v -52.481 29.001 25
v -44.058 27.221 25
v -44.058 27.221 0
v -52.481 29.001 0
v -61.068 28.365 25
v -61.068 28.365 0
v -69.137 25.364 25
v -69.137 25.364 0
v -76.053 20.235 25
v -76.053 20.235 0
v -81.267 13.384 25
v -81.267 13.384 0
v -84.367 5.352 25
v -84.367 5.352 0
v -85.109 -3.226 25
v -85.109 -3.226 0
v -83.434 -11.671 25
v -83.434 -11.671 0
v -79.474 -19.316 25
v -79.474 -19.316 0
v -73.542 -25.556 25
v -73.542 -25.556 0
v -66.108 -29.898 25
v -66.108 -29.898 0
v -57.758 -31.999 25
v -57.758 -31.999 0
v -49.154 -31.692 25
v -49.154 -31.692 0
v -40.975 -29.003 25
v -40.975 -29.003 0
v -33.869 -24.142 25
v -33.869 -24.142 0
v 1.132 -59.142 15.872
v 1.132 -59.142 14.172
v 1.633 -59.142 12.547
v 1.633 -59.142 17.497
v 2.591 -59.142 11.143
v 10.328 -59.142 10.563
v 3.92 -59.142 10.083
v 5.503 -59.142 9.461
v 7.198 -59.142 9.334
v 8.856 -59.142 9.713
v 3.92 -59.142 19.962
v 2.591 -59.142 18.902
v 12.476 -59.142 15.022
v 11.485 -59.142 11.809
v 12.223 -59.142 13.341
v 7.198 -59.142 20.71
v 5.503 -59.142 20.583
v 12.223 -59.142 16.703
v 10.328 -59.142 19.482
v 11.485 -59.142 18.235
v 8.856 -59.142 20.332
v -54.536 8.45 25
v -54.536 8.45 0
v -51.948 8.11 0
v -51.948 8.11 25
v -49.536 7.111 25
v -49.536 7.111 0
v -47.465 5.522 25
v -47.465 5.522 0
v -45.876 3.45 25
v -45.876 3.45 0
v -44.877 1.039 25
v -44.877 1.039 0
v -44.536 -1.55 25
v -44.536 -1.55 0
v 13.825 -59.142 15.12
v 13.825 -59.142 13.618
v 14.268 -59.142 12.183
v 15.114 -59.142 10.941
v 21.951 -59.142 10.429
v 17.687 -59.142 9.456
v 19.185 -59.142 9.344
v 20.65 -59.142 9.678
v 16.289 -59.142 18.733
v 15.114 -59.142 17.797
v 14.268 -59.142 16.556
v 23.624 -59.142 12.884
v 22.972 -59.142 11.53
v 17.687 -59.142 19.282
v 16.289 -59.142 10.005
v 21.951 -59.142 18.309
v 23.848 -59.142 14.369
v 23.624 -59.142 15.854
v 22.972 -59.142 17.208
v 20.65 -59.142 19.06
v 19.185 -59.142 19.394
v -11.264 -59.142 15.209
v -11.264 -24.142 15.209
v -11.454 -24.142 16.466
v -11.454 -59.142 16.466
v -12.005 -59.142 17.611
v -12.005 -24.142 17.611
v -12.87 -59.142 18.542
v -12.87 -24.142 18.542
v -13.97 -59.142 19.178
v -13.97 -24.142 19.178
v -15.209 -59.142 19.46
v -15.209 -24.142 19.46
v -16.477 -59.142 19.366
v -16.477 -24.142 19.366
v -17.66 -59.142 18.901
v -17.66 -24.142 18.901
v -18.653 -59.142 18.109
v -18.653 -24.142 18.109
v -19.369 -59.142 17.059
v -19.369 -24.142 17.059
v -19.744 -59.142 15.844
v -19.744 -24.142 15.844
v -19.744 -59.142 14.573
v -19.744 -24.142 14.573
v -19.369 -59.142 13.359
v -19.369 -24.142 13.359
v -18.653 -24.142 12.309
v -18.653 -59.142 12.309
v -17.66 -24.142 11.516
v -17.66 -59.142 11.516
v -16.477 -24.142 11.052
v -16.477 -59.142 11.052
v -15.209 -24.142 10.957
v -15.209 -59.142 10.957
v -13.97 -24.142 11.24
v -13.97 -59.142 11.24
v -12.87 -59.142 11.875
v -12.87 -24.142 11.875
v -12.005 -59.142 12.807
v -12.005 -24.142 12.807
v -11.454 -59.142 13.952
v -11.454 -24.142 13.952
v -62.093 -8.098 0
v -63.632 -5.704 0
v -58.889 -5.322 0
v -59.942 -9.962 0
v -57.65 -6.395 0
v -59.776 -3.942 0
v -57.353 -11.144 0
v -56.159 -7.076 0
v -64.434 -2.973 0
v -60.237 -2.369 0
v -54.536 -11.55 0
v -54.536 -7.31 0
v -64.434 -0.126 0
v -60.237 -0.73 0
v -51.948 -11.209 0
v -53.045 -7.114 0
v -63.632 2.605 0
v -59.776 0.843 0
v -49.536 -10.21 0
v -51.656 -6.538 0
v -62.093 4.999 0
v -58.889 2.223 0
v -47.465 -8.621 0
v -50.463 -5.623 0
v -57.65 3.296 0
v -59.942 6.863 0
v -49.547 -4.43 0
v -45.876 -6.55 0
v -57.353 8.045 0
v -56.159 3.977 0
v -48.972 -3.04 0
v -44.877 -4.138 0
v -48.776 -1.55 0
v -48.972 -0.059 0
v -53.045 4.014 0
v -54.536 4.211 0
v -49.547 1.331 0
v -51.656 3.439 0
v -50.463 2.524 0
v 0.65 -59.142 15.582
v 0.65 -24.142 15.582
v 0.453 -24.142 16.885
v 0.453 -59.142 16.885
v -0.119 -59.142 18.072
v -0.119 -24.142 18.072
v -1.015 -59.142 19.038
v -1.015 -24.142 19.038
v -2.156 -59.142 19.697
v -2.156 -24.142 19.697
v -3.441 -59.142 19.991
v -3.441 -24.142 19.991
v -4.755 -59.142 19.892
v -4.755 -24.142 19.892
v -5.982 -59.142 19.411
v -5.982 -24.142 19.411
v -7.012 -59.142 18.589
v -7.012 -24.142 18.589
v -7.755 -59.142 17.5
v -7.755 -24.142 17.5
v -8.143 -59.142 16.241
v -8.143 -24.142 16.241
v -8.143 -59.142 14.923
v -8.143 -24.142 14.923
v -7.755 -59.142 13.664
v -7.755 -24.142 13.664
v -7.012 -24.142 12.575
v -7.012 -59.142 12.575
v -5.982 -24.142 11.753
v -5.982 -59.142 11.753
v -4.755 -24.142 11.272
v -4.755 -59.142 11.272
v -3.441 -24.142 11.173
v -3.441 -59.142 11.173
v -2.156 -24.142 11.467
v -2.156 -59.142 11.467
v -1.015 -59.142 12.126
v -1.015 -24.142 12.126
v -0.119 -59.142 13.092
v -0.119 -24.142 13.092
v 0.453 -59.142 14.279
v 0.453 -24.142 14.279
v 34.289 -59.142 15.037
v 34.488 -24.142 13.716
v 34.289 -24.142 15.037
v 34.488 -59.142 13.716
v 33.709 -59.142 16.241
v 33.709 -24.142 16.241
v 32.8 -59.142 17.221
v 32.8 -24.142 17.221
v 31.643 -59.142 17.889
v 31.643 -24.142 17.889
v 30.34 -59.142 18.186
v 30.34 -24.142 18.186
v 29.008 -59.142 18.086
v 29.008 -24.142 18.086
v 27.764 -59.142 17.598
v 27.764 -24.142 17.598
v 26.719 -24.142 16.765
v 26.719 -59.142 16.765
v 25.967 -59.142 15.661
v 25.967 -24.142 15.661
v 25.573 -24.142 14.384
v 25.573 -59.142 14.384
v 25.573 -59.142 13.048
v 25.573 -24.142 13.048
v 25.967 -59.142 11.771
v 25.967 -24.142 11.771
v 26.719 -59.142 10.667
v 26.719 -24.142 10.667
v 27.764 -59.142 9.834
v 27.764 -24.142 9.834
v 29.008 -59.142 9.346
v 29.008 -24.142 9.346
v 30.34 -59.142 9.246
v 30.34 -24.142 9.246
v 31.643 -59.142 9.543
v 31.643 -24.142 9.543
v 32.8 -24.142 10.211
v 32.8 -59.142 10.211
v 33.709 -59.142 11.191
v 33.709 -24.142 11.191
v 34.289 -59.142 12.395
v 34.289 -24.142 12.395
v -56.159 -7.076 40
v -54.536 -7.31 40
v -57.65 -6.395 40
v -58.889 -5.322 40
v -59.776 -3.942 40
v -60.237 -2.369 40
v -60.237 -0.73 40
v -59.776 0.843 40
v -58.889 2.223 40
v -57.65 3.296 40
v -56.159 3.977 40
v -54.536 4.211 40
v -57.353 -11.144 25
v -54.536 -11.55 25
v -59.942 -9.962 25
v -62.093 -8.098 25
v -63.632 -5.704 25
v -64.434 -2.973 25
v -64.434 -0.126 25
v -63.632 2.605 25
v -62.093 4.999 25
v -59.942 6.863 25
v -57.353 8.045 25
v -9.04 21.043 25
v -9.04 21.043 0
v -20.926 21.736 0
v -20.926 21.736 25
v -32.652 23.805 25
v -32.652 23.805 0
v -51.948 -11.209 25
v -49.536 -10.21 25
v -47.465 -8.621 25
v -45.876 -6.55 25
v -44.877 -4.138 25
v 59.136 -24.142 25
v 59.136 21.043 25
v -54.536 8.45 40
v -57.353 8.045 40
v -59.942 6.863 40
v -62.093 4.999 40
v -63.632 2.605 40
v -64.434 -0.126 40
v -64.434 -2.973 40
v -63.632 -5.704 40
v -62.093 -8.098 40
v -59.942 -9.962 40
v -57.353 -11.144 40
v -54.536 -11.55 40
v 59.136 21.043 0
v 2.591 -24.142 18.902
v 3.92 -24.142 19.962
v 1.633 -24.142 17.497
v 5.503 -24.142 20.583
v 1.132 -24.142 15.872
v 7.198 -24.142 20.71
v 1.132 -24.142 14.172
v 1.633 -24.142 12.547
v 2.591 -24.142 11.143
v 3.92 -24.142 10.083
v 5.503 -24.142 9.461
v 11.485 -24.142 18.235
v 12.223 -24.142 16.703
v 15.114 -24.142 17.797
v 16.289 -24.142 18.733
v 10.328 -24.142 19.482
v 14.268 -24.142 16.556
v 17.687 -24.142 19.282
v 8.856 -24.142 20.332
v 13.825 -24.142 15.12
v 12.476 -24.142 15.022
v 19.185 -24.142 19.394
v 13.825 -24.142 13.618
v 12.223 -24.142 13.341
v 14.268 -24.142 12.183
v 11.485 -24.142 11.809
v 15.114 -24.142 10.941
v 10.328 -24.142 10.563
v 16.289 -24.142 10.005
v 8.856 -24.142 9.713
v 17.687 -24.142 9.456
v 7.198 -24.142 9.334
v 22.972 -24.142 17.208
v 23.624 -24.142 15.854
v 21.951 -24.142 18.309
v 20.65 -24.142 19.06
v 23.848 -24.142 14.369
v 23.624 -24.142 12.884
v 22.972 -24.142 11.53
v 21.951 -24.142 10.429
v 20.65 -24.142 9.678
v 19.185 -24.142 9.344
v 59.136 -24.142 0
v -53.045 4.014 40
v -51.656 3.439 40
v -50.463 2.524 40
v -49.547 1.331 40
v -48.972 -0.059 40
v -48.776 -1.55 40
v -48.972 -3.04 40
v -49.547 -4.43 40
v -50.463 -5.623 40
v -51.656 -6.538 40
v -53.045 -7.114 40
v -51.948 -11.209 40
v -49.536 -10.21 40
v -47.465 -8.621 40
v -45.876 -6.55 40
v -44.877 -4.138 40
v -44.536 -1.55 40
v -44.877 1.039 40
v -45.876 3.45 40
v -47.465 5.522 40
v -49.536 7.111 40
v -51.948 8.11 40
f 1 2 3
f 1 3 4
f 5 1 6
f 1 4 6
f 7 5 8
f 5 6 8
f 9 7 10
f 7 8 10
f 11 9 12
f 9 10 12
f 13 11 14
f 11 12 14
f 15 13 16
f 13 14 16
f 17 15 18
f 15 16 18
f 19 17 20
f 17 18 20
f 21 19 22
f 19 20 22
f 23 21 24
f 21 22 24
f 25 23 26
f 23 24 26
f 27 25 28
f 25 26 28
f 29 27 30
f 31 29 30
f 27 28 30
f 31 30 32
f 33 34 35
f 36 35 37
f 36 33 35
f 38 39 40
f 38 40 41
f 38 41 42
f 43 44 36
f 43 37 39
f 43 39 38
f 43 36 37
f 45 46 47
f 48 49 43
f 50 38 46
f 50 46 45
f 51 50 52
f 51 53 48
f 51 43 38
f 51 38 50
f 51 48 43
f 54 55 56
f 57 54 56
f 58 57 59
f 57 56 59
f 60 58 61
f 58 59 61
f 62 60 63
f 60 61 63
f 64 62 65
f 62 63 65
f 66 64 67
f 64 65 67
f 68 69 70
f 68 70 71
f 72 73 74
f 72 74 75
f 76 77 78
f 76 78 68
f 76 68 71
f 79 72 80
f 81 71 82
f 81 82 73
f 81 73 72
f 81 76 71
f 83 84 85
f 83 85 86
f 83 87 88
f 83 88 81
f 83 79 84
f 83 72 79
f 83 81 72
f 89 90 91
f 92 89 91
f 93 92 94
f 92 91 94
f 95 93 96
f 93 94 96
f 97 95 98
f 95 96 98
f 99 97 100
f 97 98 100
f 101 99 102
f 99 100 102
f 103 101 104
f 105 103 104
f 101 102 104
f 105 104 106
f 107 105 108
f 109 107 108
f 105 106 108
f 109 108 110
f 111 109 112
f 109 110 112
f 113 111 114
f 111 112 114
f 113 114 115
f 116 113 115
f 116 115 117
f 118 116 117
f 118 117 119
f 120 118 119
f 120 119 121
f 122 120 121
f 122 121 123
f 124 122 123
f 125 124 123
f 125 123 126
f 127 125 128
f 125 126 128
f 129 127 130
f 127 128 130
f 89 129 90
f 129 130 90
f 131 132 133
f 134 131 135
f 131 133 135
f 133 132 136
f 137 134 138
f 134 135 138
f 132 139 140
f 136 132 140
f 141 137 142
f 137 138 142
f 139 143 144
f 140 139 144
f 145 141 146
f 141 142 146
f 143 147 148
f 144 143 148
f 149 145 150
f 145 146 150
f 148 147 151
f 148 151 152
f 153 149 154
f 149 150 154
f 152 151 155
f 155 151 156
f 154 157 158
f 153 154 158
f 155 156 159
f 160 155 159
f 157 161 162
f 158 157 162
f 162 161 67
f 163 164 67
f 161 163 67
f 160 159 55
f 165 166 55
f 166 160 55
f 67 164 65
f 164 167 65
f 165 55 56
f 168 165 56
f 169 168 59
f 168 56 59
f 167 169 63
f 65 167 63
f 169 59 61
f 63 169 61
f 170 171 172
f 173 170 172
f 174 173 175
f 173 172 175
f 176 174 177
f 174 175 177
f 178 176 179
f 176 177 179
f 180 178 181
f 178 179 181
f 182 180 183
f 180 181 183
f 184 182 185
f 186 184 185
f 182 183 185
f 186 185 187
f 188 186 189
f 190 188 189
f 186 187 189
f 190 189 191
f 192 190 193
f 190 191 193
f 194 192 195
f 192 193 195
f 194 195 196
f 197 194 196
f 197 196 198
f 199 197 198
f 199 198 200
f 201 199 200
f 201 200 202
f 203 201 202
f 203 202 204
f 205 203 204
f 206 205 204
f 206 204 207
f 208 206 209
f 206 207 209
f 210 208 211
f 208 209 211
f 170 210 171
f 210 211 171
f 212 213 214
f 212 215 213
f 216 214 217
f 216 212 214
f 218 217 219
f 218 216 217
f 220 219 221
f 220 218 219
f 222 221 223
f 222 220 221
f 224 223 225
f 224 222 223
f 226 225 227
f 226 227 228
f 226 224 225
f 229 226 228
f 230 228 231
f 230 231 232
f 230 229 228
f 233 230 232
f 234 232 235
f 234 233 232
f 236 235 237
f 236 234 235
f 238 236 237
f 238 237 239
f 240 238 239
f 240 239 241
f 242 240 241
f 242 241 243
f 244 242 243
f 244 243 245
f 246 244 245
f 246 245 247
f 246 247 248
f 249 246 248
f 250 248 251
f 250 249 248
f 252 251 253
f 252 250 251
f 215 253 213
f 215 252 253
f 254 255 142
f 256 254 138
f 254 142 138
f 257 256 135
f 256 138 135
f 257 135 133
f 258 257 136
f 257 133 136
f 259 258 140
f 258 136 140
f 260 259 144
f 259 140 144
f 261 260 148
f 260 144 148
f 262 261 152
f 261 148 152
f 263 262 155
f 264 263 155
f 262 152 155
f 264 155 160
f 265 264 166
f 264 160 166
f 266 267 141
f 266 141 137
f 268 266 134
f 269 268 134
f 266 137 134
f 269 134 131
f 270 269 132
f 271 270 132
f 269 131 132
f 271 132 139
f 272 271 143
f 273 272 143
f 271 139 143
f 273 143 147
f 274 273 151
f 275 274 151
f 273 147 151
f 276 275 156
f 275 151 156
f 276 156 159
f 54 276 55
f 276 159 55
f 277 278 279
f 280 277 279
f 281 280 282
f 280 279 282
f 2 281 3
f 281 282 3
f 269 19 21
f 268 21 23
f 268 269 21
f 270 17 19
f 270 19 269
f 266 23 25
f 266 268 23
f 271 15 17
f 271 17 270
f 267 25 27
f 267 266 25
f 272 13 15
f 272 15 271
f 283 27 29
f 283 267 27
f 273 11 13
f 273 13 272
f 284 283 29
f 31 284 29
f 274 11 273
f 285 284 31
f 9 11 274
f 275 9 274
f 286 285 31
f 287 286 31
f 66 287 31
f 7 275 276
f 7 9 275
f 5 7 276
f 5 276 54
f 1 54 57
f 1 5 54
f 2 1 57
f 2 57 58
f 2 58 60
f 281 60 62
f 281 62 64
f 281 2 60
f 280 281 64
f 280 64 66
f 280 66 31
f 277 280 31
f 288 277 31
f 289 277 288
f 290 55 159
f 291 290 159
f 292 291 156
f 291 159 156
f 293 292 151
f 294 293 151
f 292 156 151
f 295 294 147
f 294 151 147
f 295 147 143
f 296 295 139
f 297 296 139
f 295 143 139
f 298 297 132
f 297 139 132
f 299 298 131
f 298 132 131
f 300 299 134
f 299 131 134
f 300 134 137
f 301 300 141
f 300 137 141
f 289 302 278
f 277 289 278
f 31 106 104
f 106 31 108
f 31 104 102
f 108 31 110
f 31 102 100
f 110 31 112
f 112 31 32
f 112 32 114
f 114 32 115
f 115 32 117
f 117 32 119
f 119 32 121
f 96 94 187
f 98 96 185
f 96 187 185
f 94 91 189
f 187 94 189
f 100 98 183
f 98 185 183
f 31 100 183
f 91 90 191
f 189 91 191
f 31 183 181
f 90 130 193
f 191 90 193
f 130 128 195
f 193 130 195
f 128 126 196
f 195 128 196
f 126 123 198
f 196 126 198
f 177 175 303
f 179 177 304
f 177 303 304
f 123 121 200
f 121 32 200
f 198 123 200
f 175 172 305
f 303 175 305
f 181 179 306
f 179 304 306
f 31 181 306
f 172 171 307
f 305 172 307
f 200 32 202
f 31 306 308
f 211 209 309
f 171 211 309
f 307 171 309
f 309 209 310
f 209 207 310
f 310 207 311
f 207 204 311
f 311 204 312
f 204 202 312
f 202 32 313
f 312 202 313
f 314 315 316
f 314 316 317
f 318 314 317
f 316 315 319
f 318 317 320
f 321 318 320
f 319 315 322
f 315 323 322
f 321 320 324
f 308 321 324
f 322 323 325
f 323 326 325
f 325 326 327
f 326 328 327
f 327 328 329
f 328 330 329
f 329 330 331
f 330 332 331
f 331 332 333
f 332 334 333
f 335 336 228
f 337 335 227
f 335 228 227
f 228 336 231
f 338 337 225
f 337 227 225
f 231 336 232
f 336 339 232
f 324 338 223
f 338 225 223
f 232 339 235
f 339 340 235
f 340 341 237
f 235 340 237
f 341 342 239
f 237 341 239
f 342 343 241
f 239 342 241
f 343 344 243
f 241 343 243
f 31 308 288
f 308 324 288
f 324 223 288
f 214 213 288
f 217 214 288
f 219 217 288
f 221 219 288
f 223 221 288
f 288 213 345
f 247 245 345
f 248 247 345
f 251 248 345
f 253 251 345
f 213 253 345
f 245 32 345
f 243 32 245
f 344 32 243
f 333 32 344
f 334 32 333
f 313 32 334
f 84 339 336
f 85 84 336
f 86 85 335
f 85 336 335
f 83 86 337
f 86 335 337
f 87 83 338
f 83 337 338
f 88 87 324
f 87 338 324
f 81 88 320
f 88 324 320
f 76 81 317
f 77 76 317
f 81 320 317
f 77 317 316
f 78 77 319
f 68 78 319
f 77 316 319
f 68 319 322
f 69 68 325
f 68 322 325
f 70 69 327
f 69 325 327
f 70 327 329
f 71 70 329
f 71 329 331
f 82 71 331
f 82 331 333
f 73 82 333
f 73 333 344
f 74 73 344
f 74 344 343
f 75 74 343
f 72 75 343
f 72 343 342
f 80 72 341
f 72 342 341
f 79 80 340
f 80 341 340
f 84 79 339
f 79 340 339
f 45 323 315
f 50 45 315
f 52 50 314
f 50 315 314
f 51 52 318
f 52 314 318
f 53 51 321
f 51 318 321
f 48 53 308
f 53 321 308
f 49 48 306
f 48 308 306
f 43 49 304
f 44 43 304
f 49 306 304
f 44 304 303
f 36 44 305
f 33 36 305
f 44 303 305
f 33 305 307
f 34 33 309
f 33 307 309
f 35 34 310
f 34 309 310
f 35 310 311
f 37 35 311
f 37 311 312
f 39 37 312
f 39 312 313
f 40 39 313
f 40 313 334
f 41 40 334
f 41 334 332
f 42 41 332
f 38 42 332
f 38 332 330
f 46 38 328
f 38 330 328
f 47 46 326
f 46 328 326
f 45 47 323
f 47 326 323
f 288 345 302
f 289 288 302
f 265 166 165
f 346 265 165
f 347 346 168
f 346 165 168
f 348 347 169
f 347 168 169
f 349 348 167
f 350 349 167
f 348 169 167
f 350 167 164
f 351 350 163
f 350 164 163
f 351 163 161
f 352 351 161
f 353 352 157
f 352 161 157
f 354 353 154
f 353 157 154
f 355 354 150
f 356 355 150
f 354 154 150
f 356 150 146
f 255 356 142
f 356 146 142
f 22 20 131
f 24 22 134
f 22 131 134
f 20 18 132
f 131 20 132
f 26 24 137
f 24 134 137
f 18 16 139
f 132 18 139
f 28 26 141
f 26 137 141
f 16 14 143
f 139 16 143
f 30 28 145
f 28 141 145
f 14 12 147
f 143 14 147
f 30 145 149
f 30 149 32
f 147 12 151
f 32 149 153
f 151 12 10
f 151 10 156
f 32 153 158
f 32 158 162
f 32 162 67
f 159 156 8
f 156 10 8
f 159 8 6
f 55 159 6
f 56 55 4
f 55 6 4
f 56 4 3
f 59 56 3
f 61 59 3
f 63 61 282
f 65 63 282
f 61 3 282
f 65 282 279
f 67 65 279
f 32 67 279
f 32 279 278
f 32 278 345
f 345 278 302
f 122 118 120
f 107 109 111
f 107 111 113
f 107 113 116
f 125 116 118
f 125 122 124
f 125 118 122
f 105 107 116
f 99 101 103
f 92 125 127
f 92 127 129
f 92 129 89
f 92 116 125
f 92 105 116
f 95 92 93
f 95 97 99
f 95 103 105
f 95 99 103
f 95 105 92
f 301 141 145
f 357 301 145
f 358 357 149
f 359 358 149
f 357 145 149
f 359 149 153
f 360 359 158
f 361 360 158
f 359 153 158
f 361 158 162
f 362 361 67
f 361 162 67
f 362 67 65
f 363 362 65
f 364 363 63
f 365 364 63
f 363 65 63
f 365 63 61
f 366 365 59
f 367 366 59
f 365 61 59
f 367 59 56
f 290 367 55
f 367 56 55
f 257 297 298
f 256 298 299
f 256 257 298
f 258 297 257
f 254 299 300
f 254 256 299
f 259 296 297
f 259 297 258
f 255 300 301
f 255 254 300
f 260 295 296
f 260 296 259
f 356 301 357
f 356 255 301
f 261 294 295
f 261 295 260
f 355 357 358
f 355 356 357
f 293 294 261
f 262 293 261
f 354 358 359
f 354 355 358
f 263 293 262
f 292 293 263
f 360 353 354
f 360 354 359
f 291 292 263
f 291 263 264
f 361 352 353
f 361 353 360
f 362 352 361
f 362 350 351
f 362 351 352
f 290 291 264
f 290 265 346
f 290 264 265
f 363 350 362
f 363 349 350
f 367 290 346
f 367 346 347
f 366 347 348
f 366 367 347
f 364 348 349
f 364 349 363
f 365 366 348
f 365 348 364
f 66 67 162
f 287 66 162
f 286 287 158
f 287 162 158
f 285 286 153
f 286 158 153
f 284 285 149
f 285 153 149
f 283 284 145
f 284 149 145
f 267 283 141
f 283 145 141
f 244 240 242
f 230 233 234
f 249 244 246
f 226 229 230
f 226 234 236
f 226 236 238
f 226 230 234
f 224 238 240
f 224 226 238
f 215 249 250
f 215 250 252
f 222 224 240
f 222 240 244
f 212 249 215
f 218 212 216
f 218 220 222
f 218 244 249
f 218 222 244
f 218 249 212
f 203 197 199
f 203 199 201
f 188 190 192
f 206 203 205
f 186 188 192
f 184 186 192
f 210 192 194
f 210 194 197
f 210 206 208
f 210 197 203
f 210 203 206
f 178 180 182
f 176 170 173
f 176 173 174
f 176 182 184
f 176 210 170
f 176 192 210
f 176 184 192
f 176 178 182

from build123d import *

# Parameters (mm, degrees)
F1_DEPTH = 25
F2_DEPTH = 40
F3_R     = 4.2635703771
F3_R_2   = 4.4209569703
F3_R_3   = 5.7038712212
F3_R_4   = 5.0393730087
F3_R_5   = 4.4825585926
F4_DEPTH = 35


with BuildPart() as f1:
    # F0 (on Top) → F1 (new body)
    with BuildSketch(Plane.XY):
        with BuildLine():
            Line((59.1363360627, 21.0431396319), (-9.0397706609, 21.0431396319))
            Line((-9.0397706609, 21.0431396319), (-33.8688298197, 21.0431396319))
            ThreePointArc((-33.8688298197, 21.0431396319), (-26.514710402, 10.7942984973), (-23.916338801, -1.5495372936))
            ThreePointArc((-23.916338801, -1.5495372936), (-26.514710402, -13.8933730846), (-33.8688298197, -24.1422142191))
            Line((-33.8688298197, -24.1422142191), (59.1363360627, -24.1422142191))
            Line((59.1363360627, -24.1422142191), (59.1363360627, 21.0431396319))
        make_face()
        with BuildLine():
            Line((-33.8688298197, 21.0431396319), (-9.0397706609, 21.0431396319))
            ThreePointArc((-9.0397706609, 21.0431396319), (-26.8191272876, 22.5995217448), (-44.0576535234, 27.2213244839))
            ThreePointArc((-44.0576535234, 27.2213244839), (-38.6598110486, 24.6326381152), (-33.8688298197, 21.0431396319))
        make_face()
        with BuildLine():
            ThreePointArc((-23.916338801, -1.5495372936), (-26.514710402, 10.7942984973), (-33.8688298197, 21.0431396319))
            Line((-33.8688298197, 21.0431396319), (-54.5358654598, 21.0431396319))
            Line((-54.5358654598, 21.0431396319), (-54.5358654598, 8.4504627064))
            ThreePointArc((-54.5358654598, 8.4504627064), (-47.4647976479, 5.5215305183), (-44.5358654598, -1.5495372936))
            ThreePointArc((-44.5358654598, -1.5495372936), (-47.4647976479, -8.6206051055), (-54.5358654598, -11.5495372936))
            Line((-54.5358654598, -11.5495372936), (-54.5358654598, -24.1422142191))
            Line((-54.5358654598, -24.1422142191), (-33.8688298197, -24.1422142191))
            ThreePointArc((-33.8688298197, -24.1422142191), (-26.514710402, -13.8933730846), (-23.916338801, -1.5495372936))
        make_face()
        with BuildLine():
            Line((-54.5358654598, 21.0431396319), (-33.8688298197, 21.0431396319))
            ThreePointArc((-33.8688298197, 21.0431396319), (-38.6598110486, 24.6326381152), (-44.0576535234, 27.2213244839))
            ThreePointArc((-44.0576535234, 27.2213244839), (-84.5701773159, -7.5073493192), (-33.8688298197, -24.1422142191))
            Line((-33.8688298197, -24.1422142191), (-54.5358654598, -24.1422142191))
            Line((-54.5358654598, -24.1422142191), (-54.5358654598, -11.5495372936))
            ThreePointArc((-54.5358654598, -11.5495372936), (-64.5358654598, -1.5495372936), (-54.5358654598, 8.4504627064))
            Line((-54.5358654598, 8.4504627064), (-54.5358654598, 21.0431396319))
        make_face()
    extrude(amount=F1_DEPTH)

    # F3 (on face) → F4 (join, symmetric)
    with BuildSketch(Plane.XZ.offset(24.1422142191)):
        with Locations((-15.5279319733, 15.2088273317)):
            Circle(F3_R)
        with Locations((-3.7714142818, 15.5820492655)):
            Circle(F3_R_2)
        with Locations((6.7721279338, 15.0222163647)):
            Circle(F3_R_3)
        with Locations((18.8085604459, 14.3690761179)):
            Circle(F3_R_4)
        with Locations((30.0052445382, 13.715935871)):
            Circle(F3_R_5)
    extrude(amount=F4_DEPTH, both=True)


with BuildPart() as f2:
    # F0 (on Top) → F2 (new body)
    with BuildSketch(Plane.XY):
        with BuildLine():
            ThreePointArc((-44.5358654598, -1.5495372936), (-47.4647976479, 5.5215305183), (-54.5358654598, 8.4504627064))
            Line((-54.5358654598, 8.4504627064), (-54.5358654598, 4.2107247108))
            ThreePointArc((-54.5358654598, 4.2107247108), (-50.462745135, 2.5235830311), (-48.7756034554, -1.5495372936))
            ThreePointArc((-48.7756034554, -1.5495372936), (-50.462745135, -5.6226576183), (-54.5358654598, -7.309799298))
            Line((-54.5358654598, -7.309799298), (-54.5358654598, -11.5495372936))
            ThreePointArc((-54.5358654598, -11.5495372936), (-47.4647976479, -8.6206051055), (-44.5358654598, -1.5495372936))
        make_face()
        with BuildLine():
            Line((-54.5358654598, 4.2107247108), (-54.5358654598, 8.4504627064))
            ThreePointArc((-54.5358654598, 8.4504627064), (-64.5358654598, -1.5495372936), (-54.5358654598, -11.5495372936))
            Line((-54.5358654598, -11.5495372936), (-54.5358654598, -7.309799298))
            ThreePointArc((-54.5358654598, -7.309799298), (-60.2961274642, -1.5495372936), (-54.5358654598, 4.2107247108))
        make_face()
    extrude(amount=F2_DEPTH)


solid = Compound([f1.part, f2.part])
